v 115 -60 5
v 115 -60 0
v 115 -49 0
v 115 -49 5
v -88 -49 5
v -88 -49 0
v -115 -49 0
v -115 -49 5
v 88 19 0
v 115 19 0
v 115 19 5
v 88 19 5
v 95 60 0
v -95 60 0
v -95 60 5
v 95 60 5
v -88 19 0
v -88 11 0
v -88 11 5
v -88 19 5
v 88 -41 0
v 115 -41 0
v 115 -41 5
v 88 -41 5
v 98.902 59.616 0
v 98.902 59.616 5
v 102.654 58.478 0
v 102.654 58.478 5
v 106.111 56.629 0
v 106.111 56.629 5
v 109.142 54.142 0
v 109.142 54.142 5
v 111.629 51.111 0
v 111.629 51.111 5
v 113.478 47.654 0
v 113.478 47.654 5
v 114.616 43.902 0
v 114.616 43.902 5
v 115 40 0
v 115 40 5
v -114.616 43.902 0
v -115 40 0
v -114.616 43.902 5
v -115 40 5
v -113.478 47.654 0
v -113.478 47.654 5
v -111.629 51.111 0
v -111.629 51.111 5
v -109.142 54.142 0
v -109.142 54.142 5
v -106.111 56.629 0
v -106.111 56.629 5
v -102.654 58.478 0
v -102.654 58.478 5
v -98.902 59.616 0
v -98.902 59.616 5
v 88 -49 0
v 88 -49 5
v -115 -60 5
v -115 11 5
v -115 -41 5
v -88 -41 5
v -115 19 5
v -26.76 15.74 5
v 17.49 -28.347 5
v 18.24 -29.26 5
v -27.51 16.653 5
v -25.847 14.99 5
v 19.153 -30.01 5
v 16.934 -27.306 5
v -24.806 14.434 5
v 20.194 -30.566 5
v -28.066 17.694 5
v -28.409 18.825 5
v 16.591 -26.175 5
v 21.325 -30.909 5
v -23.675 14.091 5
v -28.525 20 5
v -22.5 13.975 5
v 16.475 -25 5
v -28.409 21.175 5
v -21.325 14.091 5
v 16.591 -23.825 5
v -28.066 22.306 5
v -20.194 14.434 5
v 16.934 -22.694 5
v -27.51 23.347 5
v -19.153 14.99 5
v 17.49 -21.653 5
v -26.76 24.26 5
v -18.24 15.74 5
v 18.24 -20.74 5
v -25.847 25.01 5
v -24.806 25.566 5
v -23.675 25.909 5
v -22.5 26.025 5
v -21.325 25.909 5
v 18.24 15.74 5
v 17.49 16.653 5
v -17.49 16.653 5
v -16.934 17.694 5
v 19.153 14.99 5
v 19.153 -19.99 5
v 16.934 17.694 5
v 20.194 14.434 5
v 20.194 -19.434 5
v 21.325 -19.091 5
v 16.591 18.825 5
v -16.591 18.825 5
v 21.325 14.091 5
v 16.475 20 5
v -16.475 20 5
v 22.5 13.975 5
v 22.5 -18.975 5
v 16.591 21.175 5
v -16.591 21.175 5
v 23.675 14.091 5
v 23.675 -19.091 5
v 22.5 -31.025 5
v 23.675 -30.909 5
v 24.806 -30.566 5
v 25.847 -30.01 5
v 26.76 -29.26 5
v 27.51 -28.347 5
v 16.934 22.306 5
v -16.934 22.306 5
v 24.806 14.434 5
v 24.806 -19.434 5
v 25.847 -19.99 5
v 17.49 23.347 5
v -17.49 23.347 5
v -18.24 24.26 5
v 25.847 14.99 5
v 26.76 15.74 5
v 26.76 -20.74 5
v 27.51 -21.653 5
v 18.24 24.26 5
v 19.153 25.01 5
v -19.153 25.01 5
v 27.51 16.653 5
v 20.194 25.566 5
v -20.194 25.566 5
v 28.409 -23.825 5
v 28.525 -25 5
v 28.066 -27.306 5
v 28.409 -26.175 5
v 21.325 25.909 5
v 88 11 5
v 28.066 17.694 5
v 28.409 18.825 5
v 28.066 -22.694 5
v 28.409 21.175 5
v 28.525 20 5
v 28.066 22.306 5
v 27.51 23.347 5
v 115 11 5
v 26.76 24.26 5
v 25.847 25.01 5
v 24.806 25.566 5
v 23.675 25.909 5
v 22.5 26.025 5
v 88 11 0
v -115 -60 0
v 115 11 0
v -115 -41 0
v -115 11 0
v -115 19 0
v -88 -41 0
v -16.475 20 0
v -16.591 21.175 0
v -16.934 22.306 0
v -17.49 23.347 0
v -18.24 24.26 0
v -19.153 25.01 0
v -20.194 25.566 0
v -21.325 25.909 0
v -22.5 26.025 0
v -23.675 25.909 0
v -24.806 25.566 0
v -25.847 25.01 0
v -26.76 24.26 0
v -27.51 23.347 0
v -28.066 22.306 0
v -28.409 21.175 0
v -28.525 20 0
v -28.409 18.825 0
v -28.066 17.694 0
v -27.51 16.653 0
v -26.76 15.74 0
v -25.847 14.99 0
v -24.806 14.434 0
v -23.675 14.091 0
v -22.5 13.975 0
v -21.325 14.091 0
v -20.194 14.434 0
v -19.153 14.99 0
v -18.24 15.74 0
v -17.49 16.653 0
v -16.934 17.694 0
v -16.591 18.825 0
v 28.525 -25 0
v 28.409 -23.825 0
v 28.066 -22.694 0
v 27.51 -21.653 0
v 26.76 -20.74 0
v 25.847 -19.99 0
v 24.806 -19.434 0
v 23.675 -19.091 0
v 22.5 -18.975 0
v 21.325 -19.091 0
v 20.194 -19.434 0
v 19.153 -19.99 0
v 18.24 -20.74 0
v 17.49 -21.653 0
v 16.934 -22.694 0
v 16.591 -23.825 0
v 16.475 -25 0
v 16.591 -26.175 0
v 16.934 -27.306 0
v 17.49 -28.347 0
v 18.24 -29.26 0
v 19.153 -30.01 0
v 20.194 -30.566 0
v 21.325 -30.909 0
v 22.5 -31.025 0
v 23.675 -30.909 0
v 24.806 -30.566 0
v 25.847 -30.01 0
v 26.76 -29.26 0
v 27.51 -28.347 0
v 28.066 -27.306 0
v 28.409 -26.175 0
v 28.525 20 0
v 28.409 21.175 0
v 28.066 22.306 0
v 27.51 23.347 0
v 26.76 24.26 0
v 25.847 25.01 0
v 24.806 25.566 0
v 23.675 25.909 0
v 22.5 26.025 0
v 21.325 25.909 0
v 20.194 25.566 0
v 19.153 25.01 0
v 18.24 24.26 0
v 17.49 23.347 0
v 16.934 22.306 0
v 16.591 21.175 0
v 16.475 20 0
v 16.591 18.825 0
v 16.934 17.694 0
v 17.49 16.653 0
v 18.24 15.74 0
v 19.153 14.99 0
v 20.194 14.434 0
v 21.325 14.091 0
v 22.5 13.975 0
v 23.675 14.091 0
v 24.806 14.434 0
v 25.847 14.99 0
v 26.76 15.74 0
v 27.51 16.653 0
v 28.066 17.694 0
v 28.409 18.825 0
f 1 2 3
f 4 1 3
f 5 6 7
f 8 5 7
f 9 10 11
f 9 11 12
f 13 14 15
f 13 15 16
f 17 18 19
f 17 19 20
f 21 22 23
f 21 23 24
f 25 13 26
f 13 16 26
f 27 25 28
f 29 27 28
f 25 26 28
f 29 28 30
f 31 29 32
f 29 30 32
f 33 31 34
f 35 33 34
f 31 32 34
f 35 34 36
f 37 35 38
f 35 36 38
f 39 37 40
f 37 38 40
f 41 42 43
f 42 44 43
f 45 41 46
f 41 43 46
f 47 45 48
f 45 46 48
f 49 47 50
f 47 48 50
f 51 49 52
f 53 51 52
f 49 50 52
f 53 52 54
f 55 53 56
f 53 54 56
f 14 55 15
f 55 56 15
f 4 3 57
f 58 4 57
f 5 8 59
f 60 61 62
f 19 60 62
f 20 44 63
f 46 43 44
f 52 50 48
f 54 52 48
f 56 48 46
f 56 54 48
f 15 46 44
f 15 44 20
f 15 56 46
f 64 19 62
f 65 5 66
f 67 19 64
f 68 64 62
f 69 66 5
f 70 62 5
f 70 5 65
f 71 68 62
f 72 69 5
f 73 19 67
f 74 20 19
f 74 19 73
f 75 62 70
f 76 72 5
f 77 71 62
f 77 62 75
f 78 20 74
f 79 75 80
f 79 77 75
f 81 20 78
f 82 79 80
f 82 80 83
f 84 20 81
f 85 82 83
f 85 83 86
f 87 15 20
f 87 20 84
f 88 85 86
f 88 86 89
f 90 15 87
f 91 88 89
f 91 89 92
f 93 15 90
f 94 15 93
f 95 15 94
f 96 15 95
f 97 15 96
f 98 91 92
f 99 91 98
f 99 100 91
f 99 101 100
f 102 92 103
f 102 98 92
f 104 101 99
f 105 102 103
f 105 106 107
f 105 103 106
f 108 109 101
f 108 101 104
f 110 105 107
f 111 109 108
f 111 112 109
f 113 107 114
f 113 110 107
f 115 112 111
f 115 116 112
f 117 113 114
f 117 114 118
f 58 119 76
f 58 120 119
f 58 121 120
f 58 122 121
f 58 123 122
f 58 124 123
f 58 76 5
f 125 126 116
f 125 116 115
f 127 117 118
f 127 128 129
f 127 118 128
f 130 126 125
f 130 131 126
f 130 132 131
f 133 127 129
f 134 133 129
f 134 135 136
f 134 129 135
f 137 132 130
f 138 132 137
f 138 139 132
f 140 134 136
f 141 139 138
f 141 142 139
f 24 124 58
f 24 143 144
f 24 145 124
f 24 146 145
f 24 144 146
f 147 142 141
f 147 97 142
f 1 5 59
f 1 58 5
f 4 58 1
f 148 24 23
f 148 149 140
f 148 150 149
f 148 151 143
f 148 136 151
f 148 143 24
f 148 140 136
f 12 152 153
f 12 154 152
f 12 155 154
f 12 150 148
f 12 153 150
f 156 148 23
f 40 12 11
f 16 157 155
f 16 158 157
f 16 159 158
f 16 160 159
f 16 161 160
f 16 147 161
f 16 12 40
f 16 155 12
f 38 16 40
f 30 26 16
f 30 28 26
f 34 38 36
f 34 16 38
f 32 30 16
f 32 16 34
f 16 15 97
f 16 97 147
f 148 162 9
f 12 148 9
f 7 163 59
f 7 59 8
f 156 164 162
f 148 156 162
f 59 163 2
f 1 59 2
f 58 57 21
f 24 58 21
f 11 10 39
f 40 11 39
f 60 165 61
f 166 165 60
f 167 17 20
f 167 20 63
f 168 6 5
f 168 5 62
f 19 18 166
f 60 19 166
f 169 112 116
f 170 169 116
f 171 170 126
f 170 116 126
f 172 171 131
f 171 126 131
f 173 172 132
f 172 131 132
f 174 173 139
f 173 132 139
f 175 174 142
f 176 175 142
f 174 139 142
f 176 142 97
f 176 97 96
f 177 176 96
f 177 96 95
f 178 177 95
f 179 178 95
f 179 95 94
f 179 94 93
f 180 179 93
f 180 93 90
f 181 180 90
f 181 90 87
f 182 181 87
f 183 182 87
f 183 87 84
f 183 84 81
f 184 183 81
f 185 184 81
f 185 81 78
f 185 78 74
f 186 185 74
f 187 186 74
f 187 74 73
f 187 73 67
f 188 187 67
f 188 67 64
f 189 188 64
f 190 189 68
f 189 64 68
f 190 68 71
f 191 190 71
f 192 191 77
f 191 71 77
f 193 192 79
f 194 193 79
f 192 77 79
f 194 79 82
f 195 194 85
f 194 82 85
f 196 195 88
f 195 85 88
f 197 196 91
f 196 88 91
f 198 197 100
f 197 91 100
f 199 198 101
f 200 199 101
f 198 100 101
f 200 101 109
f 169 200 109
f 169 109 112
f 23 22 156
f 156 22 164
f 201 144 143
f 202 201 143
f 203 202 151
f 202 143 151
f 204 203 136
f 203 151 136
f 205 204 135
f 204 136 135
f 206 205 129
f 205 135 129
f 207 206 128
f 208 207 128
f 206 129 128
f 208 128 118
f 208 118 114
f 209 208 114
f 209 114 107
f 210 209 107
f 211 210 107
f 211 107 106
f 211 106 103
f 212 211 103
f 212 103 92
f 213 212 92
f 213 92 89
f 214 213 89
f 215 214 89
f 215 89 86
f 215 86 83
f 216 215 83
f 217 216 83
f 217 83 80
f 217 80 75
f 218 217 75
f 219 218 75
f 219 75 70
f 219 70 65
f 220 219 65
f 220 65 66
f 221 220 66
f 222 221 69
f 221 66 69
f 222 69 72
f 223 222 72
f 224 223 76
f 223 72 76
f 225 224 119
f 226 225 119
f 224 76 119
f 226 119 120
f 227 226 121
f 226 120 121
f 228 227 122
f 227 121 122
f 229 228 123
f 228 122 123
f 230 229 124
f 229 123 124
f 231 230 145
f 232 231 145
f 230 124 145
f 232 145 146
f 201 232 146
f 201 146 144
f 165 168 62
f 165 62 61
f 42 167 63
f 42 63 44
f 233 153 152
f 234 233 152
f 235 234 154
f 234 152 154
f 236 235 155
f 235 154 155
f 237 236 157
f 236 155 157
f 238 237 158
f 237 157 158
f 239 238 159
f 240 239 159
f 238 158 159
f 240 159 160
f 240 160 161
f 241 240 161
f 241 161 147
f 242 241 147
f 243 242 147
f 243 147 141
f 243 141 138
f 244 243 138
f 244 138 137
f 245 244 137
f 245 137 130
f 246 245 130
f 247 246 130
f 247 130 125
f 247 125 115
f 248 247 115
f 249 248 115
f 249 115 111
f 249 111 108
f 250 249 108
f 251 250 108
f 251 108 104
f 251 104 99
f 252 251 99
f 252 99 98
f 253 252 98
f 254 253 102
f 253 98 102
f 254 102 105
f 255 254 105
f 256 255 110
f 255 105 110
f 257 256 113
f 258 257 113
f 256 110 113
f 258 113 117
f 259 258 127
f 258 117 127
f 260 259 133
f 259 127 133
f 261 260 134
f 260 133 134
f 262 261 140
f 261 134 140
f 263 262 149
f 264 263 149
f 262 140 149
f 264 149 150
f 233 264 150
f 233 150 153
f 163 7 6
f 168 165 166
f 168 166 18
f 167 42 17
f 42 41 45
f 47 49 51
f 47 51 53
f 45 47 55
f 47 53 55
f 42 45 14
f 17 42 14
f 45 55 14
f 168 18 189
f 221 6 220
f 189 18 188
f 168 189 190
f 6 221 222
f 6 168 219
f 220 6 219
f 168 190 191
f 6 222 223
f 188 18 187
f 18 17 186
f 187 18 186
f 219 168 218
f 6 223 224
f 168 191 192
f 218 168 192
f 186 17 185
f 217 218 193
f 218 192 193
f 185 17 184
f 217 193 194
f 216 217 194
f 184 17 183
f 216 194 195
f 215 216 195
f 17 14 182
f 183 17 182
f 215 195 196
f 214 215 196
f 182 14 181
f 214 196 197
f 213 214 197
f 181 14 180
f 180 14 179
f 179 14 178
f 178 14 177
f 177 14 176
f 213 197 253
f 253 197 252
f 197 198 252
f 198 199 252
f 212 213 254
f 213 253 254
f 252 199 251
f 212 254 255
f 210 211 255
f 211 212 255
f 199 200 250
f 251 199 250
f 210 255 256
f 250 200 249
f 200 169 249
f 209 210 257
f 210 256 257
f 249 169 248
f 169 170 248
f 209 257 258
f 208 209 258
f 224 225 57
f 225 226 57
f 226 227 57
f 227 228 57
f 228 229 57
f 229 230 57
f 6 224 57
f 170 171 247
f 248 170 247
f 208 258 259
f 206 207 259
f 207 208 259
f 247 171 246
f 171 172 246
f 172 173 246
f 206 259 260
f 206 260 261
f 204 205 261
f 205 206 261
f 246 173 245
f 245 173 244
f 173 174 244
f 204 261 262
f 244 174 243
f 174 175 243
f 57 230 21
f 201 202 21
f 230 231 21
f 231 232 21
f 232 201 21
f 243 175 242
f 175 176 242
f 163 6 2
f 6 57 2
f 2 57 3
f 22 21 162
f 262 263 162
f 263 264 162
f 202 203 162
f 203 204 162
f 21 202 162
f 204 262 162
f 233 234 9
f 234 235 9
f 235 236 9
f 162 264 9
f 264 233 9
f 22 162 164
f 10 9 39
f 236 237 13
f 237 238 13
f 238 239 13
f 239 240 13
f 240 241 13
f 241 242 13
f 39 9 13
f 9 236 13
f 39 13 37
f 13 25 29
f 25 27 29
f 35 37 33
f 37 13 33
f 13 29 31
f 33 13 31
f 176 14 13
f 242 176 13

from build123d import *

# Parameters (mm, degrees)
SKETCH1_W           = 230
SKETCH1_H           = 120
BOSS_EXTRUDE1_DEPTH = 5
CUT_EXTRUDE1_REACH  = 131.808
SKETCH2_W           = 27
SKETCH2_H           = 8.000000001
CUT_EXTRUDE2_REACH  = 131.808
SKETCH3_R           = 6.025
FILLET1_R           = 20


with BuildPart() as part:
    # Sketch1 → Boss-Extrude1 (new body)
    with BuildSketch(Plane.XY):
        Rectangle(SKETCH1_W, SKETCH1_H)
    extrude(amount=BOSS_EXTRUDE1_DEPTH)

    # Sketch2 → Cut-Extrude1 (cut, up to next)
    with BuildSketch(Plane(origin=(0, 0, 0), x_dir=(-1, 0, 0), z_dir=(0, 0, -1)), mode=Mode.PRIVATE) as cut_extrude1_sk1:
        with Locations((101.5, 15.000000001)):
            Rectangle(SKETCH2_W, SKETCH2_H)
    cut_extrude1_tool1 = extrude(cut_extrude1_sk1.sketch, amount=-CUT_EXTRUDE1_REACH, mode=Mode.PRIVATE) & part.part
    # Sketch2 → Cut-Extrude1 (cut, up to next)
    with BuildSketch(Plane(origin=(0, 0, 0), x_dir=(-1, 0, 0), z_dir=(0, 0, -1)), mode=Mode.PRIVATE) as cut_extrude1_sk2:
        with Locations((101.5, -45.000000001)):
            Rectangle(SKETCH2_W, SKETCH2_H)
    cut_extrude1_tool2 = extrude(cut_extrude1_sk2.sketch, amount=-CUT_EXTRUDE1_REACH, mode=Mode.PRIVATE) & part.part
    # Sketch2 → Cut-Extrude1 (cut, up to next)
    with BuildSketch(Plane(origin=(0, 0, 0), x_dir=(-1, 0, 0), z_dir=(0, 0, -1)), mode=Mode.PRIVATE) as cut_extrude1_sk3:
        with Locations((-101.5, -45.000000001)):
            Rectangle(SKETCH2_W, SKETCH2_H)
    cut_extrude1_tool3 = extrude(cut_extrude1_sk3.sketch, amount=-CUT_EXTRUDE1_REACH, mode=Mode.PRIVATE) & part.part
    # Sketch2 → Cut-Extrude1 (cut, up to next)
    with BuildSketch(Plane(origin=(0, 0, 0), x_dir=(-1, 0, 0), z_dir=(0, 0, -1)), mode=Mode.PRIVATE) as cut_extrude1_sk4:
        with Locations((-101.5, 15.000000001)):
            Rectangle(SKETCH2_W, SKETCH2_H)
    cut_extrude1_tool4 = extrude(cut_extrude1_sk4.sketch, amount=-CUT_EXTRUDE1_REACH, mode=Mode.PRIVATE) & part.part
    add(cut_extrude1_tool1.solids().sort_by_distance((-101.5, 15, 0))[0], mode=Mode.SUBTRACT)
    add(cut_extrude1_tool2.solids().sort_by_distance((-101.5, -45, 0))[0], mode=Mode.SUBTRACT)
    add(cut_extrude1_tool3.solids().sort_by_distance((101.5, -45, 0))[0], mode=Mode.SUBTRACT)
    add(cut_extrude1_tool4.solids().sort_by_distance((101.5, 15, 0))[0], mode=Mode.SUBTRACT)

    # Sketch3 → Cut-Extrude2 (cut, up to next)
    with BuildSketch(Plane.XY.offset(5), mode=Mode.PRIVATE) as cut_extrude2_sk1:
        with Locations((22.5, 20)):
            Circle(SKETCH3_R)
    cut_extrude2_tool1 = extrude(cut_extrude2_sk1.sketch, amount=-CUT_EXTRUDE2_REACH, mode=Mode.PRIVATE) & part.part
    # Sketch3 → Cut-Extrude2 (cut, up to next)
    with BuildSketch(Plane.XY.offset(5), mode=Mode.PRIVATE) as cut_extrude2_sk2:
        with Locations((-22.5, 20)):
            Circle(SKETCH3_R)
    cut_extrude2_tool2 = extrude(cut_extrude2_sk2.sketch, amount=-CUT_EXTRUDE2_REACH, mode=Mode.PRIVATE) & part.part
    # Sketch3 → Cut-Extrude2 (cut, up to next)
    with BuildSketch(Plane.XY.offset(5), mode=Mode.PRIVATE) as cut_extrude2_sk3:
        with Locations((22.5, -25)):
            Circle(SKETCH3_R)
    cut_extrude2_tool3 = extrude(cut_extrude2_sk3.sketch, amount=-CUT_EXTRUDE2_REACH, mode=Mode.PRIVATE) & part.part
    add(cut_extrude2_tool1.solids().sort_by_distance((22.5, 20, 5))[0], mode=Mode.SUBTRACT)
    add(cut_extrude2_tool2.solids().sort_by_distance((-22.5, 20, 5))[0], mode=Mode.SUBTRACT)
    add(cut_extrude2_tool3.solids().sort_by_distance((22.5, -25, 5))[0], mode=Mode.SUBTRACT)

    # Fillet1
    fillet1_edges = [part.edges().sort_by_distance(p)[0] for p in [
        (-115, 60, 2.5),
        (115, 60, 2.5),
    ]]
    fillet(fillet1_edges, radius=FILLET1_R)


solid = part.part
